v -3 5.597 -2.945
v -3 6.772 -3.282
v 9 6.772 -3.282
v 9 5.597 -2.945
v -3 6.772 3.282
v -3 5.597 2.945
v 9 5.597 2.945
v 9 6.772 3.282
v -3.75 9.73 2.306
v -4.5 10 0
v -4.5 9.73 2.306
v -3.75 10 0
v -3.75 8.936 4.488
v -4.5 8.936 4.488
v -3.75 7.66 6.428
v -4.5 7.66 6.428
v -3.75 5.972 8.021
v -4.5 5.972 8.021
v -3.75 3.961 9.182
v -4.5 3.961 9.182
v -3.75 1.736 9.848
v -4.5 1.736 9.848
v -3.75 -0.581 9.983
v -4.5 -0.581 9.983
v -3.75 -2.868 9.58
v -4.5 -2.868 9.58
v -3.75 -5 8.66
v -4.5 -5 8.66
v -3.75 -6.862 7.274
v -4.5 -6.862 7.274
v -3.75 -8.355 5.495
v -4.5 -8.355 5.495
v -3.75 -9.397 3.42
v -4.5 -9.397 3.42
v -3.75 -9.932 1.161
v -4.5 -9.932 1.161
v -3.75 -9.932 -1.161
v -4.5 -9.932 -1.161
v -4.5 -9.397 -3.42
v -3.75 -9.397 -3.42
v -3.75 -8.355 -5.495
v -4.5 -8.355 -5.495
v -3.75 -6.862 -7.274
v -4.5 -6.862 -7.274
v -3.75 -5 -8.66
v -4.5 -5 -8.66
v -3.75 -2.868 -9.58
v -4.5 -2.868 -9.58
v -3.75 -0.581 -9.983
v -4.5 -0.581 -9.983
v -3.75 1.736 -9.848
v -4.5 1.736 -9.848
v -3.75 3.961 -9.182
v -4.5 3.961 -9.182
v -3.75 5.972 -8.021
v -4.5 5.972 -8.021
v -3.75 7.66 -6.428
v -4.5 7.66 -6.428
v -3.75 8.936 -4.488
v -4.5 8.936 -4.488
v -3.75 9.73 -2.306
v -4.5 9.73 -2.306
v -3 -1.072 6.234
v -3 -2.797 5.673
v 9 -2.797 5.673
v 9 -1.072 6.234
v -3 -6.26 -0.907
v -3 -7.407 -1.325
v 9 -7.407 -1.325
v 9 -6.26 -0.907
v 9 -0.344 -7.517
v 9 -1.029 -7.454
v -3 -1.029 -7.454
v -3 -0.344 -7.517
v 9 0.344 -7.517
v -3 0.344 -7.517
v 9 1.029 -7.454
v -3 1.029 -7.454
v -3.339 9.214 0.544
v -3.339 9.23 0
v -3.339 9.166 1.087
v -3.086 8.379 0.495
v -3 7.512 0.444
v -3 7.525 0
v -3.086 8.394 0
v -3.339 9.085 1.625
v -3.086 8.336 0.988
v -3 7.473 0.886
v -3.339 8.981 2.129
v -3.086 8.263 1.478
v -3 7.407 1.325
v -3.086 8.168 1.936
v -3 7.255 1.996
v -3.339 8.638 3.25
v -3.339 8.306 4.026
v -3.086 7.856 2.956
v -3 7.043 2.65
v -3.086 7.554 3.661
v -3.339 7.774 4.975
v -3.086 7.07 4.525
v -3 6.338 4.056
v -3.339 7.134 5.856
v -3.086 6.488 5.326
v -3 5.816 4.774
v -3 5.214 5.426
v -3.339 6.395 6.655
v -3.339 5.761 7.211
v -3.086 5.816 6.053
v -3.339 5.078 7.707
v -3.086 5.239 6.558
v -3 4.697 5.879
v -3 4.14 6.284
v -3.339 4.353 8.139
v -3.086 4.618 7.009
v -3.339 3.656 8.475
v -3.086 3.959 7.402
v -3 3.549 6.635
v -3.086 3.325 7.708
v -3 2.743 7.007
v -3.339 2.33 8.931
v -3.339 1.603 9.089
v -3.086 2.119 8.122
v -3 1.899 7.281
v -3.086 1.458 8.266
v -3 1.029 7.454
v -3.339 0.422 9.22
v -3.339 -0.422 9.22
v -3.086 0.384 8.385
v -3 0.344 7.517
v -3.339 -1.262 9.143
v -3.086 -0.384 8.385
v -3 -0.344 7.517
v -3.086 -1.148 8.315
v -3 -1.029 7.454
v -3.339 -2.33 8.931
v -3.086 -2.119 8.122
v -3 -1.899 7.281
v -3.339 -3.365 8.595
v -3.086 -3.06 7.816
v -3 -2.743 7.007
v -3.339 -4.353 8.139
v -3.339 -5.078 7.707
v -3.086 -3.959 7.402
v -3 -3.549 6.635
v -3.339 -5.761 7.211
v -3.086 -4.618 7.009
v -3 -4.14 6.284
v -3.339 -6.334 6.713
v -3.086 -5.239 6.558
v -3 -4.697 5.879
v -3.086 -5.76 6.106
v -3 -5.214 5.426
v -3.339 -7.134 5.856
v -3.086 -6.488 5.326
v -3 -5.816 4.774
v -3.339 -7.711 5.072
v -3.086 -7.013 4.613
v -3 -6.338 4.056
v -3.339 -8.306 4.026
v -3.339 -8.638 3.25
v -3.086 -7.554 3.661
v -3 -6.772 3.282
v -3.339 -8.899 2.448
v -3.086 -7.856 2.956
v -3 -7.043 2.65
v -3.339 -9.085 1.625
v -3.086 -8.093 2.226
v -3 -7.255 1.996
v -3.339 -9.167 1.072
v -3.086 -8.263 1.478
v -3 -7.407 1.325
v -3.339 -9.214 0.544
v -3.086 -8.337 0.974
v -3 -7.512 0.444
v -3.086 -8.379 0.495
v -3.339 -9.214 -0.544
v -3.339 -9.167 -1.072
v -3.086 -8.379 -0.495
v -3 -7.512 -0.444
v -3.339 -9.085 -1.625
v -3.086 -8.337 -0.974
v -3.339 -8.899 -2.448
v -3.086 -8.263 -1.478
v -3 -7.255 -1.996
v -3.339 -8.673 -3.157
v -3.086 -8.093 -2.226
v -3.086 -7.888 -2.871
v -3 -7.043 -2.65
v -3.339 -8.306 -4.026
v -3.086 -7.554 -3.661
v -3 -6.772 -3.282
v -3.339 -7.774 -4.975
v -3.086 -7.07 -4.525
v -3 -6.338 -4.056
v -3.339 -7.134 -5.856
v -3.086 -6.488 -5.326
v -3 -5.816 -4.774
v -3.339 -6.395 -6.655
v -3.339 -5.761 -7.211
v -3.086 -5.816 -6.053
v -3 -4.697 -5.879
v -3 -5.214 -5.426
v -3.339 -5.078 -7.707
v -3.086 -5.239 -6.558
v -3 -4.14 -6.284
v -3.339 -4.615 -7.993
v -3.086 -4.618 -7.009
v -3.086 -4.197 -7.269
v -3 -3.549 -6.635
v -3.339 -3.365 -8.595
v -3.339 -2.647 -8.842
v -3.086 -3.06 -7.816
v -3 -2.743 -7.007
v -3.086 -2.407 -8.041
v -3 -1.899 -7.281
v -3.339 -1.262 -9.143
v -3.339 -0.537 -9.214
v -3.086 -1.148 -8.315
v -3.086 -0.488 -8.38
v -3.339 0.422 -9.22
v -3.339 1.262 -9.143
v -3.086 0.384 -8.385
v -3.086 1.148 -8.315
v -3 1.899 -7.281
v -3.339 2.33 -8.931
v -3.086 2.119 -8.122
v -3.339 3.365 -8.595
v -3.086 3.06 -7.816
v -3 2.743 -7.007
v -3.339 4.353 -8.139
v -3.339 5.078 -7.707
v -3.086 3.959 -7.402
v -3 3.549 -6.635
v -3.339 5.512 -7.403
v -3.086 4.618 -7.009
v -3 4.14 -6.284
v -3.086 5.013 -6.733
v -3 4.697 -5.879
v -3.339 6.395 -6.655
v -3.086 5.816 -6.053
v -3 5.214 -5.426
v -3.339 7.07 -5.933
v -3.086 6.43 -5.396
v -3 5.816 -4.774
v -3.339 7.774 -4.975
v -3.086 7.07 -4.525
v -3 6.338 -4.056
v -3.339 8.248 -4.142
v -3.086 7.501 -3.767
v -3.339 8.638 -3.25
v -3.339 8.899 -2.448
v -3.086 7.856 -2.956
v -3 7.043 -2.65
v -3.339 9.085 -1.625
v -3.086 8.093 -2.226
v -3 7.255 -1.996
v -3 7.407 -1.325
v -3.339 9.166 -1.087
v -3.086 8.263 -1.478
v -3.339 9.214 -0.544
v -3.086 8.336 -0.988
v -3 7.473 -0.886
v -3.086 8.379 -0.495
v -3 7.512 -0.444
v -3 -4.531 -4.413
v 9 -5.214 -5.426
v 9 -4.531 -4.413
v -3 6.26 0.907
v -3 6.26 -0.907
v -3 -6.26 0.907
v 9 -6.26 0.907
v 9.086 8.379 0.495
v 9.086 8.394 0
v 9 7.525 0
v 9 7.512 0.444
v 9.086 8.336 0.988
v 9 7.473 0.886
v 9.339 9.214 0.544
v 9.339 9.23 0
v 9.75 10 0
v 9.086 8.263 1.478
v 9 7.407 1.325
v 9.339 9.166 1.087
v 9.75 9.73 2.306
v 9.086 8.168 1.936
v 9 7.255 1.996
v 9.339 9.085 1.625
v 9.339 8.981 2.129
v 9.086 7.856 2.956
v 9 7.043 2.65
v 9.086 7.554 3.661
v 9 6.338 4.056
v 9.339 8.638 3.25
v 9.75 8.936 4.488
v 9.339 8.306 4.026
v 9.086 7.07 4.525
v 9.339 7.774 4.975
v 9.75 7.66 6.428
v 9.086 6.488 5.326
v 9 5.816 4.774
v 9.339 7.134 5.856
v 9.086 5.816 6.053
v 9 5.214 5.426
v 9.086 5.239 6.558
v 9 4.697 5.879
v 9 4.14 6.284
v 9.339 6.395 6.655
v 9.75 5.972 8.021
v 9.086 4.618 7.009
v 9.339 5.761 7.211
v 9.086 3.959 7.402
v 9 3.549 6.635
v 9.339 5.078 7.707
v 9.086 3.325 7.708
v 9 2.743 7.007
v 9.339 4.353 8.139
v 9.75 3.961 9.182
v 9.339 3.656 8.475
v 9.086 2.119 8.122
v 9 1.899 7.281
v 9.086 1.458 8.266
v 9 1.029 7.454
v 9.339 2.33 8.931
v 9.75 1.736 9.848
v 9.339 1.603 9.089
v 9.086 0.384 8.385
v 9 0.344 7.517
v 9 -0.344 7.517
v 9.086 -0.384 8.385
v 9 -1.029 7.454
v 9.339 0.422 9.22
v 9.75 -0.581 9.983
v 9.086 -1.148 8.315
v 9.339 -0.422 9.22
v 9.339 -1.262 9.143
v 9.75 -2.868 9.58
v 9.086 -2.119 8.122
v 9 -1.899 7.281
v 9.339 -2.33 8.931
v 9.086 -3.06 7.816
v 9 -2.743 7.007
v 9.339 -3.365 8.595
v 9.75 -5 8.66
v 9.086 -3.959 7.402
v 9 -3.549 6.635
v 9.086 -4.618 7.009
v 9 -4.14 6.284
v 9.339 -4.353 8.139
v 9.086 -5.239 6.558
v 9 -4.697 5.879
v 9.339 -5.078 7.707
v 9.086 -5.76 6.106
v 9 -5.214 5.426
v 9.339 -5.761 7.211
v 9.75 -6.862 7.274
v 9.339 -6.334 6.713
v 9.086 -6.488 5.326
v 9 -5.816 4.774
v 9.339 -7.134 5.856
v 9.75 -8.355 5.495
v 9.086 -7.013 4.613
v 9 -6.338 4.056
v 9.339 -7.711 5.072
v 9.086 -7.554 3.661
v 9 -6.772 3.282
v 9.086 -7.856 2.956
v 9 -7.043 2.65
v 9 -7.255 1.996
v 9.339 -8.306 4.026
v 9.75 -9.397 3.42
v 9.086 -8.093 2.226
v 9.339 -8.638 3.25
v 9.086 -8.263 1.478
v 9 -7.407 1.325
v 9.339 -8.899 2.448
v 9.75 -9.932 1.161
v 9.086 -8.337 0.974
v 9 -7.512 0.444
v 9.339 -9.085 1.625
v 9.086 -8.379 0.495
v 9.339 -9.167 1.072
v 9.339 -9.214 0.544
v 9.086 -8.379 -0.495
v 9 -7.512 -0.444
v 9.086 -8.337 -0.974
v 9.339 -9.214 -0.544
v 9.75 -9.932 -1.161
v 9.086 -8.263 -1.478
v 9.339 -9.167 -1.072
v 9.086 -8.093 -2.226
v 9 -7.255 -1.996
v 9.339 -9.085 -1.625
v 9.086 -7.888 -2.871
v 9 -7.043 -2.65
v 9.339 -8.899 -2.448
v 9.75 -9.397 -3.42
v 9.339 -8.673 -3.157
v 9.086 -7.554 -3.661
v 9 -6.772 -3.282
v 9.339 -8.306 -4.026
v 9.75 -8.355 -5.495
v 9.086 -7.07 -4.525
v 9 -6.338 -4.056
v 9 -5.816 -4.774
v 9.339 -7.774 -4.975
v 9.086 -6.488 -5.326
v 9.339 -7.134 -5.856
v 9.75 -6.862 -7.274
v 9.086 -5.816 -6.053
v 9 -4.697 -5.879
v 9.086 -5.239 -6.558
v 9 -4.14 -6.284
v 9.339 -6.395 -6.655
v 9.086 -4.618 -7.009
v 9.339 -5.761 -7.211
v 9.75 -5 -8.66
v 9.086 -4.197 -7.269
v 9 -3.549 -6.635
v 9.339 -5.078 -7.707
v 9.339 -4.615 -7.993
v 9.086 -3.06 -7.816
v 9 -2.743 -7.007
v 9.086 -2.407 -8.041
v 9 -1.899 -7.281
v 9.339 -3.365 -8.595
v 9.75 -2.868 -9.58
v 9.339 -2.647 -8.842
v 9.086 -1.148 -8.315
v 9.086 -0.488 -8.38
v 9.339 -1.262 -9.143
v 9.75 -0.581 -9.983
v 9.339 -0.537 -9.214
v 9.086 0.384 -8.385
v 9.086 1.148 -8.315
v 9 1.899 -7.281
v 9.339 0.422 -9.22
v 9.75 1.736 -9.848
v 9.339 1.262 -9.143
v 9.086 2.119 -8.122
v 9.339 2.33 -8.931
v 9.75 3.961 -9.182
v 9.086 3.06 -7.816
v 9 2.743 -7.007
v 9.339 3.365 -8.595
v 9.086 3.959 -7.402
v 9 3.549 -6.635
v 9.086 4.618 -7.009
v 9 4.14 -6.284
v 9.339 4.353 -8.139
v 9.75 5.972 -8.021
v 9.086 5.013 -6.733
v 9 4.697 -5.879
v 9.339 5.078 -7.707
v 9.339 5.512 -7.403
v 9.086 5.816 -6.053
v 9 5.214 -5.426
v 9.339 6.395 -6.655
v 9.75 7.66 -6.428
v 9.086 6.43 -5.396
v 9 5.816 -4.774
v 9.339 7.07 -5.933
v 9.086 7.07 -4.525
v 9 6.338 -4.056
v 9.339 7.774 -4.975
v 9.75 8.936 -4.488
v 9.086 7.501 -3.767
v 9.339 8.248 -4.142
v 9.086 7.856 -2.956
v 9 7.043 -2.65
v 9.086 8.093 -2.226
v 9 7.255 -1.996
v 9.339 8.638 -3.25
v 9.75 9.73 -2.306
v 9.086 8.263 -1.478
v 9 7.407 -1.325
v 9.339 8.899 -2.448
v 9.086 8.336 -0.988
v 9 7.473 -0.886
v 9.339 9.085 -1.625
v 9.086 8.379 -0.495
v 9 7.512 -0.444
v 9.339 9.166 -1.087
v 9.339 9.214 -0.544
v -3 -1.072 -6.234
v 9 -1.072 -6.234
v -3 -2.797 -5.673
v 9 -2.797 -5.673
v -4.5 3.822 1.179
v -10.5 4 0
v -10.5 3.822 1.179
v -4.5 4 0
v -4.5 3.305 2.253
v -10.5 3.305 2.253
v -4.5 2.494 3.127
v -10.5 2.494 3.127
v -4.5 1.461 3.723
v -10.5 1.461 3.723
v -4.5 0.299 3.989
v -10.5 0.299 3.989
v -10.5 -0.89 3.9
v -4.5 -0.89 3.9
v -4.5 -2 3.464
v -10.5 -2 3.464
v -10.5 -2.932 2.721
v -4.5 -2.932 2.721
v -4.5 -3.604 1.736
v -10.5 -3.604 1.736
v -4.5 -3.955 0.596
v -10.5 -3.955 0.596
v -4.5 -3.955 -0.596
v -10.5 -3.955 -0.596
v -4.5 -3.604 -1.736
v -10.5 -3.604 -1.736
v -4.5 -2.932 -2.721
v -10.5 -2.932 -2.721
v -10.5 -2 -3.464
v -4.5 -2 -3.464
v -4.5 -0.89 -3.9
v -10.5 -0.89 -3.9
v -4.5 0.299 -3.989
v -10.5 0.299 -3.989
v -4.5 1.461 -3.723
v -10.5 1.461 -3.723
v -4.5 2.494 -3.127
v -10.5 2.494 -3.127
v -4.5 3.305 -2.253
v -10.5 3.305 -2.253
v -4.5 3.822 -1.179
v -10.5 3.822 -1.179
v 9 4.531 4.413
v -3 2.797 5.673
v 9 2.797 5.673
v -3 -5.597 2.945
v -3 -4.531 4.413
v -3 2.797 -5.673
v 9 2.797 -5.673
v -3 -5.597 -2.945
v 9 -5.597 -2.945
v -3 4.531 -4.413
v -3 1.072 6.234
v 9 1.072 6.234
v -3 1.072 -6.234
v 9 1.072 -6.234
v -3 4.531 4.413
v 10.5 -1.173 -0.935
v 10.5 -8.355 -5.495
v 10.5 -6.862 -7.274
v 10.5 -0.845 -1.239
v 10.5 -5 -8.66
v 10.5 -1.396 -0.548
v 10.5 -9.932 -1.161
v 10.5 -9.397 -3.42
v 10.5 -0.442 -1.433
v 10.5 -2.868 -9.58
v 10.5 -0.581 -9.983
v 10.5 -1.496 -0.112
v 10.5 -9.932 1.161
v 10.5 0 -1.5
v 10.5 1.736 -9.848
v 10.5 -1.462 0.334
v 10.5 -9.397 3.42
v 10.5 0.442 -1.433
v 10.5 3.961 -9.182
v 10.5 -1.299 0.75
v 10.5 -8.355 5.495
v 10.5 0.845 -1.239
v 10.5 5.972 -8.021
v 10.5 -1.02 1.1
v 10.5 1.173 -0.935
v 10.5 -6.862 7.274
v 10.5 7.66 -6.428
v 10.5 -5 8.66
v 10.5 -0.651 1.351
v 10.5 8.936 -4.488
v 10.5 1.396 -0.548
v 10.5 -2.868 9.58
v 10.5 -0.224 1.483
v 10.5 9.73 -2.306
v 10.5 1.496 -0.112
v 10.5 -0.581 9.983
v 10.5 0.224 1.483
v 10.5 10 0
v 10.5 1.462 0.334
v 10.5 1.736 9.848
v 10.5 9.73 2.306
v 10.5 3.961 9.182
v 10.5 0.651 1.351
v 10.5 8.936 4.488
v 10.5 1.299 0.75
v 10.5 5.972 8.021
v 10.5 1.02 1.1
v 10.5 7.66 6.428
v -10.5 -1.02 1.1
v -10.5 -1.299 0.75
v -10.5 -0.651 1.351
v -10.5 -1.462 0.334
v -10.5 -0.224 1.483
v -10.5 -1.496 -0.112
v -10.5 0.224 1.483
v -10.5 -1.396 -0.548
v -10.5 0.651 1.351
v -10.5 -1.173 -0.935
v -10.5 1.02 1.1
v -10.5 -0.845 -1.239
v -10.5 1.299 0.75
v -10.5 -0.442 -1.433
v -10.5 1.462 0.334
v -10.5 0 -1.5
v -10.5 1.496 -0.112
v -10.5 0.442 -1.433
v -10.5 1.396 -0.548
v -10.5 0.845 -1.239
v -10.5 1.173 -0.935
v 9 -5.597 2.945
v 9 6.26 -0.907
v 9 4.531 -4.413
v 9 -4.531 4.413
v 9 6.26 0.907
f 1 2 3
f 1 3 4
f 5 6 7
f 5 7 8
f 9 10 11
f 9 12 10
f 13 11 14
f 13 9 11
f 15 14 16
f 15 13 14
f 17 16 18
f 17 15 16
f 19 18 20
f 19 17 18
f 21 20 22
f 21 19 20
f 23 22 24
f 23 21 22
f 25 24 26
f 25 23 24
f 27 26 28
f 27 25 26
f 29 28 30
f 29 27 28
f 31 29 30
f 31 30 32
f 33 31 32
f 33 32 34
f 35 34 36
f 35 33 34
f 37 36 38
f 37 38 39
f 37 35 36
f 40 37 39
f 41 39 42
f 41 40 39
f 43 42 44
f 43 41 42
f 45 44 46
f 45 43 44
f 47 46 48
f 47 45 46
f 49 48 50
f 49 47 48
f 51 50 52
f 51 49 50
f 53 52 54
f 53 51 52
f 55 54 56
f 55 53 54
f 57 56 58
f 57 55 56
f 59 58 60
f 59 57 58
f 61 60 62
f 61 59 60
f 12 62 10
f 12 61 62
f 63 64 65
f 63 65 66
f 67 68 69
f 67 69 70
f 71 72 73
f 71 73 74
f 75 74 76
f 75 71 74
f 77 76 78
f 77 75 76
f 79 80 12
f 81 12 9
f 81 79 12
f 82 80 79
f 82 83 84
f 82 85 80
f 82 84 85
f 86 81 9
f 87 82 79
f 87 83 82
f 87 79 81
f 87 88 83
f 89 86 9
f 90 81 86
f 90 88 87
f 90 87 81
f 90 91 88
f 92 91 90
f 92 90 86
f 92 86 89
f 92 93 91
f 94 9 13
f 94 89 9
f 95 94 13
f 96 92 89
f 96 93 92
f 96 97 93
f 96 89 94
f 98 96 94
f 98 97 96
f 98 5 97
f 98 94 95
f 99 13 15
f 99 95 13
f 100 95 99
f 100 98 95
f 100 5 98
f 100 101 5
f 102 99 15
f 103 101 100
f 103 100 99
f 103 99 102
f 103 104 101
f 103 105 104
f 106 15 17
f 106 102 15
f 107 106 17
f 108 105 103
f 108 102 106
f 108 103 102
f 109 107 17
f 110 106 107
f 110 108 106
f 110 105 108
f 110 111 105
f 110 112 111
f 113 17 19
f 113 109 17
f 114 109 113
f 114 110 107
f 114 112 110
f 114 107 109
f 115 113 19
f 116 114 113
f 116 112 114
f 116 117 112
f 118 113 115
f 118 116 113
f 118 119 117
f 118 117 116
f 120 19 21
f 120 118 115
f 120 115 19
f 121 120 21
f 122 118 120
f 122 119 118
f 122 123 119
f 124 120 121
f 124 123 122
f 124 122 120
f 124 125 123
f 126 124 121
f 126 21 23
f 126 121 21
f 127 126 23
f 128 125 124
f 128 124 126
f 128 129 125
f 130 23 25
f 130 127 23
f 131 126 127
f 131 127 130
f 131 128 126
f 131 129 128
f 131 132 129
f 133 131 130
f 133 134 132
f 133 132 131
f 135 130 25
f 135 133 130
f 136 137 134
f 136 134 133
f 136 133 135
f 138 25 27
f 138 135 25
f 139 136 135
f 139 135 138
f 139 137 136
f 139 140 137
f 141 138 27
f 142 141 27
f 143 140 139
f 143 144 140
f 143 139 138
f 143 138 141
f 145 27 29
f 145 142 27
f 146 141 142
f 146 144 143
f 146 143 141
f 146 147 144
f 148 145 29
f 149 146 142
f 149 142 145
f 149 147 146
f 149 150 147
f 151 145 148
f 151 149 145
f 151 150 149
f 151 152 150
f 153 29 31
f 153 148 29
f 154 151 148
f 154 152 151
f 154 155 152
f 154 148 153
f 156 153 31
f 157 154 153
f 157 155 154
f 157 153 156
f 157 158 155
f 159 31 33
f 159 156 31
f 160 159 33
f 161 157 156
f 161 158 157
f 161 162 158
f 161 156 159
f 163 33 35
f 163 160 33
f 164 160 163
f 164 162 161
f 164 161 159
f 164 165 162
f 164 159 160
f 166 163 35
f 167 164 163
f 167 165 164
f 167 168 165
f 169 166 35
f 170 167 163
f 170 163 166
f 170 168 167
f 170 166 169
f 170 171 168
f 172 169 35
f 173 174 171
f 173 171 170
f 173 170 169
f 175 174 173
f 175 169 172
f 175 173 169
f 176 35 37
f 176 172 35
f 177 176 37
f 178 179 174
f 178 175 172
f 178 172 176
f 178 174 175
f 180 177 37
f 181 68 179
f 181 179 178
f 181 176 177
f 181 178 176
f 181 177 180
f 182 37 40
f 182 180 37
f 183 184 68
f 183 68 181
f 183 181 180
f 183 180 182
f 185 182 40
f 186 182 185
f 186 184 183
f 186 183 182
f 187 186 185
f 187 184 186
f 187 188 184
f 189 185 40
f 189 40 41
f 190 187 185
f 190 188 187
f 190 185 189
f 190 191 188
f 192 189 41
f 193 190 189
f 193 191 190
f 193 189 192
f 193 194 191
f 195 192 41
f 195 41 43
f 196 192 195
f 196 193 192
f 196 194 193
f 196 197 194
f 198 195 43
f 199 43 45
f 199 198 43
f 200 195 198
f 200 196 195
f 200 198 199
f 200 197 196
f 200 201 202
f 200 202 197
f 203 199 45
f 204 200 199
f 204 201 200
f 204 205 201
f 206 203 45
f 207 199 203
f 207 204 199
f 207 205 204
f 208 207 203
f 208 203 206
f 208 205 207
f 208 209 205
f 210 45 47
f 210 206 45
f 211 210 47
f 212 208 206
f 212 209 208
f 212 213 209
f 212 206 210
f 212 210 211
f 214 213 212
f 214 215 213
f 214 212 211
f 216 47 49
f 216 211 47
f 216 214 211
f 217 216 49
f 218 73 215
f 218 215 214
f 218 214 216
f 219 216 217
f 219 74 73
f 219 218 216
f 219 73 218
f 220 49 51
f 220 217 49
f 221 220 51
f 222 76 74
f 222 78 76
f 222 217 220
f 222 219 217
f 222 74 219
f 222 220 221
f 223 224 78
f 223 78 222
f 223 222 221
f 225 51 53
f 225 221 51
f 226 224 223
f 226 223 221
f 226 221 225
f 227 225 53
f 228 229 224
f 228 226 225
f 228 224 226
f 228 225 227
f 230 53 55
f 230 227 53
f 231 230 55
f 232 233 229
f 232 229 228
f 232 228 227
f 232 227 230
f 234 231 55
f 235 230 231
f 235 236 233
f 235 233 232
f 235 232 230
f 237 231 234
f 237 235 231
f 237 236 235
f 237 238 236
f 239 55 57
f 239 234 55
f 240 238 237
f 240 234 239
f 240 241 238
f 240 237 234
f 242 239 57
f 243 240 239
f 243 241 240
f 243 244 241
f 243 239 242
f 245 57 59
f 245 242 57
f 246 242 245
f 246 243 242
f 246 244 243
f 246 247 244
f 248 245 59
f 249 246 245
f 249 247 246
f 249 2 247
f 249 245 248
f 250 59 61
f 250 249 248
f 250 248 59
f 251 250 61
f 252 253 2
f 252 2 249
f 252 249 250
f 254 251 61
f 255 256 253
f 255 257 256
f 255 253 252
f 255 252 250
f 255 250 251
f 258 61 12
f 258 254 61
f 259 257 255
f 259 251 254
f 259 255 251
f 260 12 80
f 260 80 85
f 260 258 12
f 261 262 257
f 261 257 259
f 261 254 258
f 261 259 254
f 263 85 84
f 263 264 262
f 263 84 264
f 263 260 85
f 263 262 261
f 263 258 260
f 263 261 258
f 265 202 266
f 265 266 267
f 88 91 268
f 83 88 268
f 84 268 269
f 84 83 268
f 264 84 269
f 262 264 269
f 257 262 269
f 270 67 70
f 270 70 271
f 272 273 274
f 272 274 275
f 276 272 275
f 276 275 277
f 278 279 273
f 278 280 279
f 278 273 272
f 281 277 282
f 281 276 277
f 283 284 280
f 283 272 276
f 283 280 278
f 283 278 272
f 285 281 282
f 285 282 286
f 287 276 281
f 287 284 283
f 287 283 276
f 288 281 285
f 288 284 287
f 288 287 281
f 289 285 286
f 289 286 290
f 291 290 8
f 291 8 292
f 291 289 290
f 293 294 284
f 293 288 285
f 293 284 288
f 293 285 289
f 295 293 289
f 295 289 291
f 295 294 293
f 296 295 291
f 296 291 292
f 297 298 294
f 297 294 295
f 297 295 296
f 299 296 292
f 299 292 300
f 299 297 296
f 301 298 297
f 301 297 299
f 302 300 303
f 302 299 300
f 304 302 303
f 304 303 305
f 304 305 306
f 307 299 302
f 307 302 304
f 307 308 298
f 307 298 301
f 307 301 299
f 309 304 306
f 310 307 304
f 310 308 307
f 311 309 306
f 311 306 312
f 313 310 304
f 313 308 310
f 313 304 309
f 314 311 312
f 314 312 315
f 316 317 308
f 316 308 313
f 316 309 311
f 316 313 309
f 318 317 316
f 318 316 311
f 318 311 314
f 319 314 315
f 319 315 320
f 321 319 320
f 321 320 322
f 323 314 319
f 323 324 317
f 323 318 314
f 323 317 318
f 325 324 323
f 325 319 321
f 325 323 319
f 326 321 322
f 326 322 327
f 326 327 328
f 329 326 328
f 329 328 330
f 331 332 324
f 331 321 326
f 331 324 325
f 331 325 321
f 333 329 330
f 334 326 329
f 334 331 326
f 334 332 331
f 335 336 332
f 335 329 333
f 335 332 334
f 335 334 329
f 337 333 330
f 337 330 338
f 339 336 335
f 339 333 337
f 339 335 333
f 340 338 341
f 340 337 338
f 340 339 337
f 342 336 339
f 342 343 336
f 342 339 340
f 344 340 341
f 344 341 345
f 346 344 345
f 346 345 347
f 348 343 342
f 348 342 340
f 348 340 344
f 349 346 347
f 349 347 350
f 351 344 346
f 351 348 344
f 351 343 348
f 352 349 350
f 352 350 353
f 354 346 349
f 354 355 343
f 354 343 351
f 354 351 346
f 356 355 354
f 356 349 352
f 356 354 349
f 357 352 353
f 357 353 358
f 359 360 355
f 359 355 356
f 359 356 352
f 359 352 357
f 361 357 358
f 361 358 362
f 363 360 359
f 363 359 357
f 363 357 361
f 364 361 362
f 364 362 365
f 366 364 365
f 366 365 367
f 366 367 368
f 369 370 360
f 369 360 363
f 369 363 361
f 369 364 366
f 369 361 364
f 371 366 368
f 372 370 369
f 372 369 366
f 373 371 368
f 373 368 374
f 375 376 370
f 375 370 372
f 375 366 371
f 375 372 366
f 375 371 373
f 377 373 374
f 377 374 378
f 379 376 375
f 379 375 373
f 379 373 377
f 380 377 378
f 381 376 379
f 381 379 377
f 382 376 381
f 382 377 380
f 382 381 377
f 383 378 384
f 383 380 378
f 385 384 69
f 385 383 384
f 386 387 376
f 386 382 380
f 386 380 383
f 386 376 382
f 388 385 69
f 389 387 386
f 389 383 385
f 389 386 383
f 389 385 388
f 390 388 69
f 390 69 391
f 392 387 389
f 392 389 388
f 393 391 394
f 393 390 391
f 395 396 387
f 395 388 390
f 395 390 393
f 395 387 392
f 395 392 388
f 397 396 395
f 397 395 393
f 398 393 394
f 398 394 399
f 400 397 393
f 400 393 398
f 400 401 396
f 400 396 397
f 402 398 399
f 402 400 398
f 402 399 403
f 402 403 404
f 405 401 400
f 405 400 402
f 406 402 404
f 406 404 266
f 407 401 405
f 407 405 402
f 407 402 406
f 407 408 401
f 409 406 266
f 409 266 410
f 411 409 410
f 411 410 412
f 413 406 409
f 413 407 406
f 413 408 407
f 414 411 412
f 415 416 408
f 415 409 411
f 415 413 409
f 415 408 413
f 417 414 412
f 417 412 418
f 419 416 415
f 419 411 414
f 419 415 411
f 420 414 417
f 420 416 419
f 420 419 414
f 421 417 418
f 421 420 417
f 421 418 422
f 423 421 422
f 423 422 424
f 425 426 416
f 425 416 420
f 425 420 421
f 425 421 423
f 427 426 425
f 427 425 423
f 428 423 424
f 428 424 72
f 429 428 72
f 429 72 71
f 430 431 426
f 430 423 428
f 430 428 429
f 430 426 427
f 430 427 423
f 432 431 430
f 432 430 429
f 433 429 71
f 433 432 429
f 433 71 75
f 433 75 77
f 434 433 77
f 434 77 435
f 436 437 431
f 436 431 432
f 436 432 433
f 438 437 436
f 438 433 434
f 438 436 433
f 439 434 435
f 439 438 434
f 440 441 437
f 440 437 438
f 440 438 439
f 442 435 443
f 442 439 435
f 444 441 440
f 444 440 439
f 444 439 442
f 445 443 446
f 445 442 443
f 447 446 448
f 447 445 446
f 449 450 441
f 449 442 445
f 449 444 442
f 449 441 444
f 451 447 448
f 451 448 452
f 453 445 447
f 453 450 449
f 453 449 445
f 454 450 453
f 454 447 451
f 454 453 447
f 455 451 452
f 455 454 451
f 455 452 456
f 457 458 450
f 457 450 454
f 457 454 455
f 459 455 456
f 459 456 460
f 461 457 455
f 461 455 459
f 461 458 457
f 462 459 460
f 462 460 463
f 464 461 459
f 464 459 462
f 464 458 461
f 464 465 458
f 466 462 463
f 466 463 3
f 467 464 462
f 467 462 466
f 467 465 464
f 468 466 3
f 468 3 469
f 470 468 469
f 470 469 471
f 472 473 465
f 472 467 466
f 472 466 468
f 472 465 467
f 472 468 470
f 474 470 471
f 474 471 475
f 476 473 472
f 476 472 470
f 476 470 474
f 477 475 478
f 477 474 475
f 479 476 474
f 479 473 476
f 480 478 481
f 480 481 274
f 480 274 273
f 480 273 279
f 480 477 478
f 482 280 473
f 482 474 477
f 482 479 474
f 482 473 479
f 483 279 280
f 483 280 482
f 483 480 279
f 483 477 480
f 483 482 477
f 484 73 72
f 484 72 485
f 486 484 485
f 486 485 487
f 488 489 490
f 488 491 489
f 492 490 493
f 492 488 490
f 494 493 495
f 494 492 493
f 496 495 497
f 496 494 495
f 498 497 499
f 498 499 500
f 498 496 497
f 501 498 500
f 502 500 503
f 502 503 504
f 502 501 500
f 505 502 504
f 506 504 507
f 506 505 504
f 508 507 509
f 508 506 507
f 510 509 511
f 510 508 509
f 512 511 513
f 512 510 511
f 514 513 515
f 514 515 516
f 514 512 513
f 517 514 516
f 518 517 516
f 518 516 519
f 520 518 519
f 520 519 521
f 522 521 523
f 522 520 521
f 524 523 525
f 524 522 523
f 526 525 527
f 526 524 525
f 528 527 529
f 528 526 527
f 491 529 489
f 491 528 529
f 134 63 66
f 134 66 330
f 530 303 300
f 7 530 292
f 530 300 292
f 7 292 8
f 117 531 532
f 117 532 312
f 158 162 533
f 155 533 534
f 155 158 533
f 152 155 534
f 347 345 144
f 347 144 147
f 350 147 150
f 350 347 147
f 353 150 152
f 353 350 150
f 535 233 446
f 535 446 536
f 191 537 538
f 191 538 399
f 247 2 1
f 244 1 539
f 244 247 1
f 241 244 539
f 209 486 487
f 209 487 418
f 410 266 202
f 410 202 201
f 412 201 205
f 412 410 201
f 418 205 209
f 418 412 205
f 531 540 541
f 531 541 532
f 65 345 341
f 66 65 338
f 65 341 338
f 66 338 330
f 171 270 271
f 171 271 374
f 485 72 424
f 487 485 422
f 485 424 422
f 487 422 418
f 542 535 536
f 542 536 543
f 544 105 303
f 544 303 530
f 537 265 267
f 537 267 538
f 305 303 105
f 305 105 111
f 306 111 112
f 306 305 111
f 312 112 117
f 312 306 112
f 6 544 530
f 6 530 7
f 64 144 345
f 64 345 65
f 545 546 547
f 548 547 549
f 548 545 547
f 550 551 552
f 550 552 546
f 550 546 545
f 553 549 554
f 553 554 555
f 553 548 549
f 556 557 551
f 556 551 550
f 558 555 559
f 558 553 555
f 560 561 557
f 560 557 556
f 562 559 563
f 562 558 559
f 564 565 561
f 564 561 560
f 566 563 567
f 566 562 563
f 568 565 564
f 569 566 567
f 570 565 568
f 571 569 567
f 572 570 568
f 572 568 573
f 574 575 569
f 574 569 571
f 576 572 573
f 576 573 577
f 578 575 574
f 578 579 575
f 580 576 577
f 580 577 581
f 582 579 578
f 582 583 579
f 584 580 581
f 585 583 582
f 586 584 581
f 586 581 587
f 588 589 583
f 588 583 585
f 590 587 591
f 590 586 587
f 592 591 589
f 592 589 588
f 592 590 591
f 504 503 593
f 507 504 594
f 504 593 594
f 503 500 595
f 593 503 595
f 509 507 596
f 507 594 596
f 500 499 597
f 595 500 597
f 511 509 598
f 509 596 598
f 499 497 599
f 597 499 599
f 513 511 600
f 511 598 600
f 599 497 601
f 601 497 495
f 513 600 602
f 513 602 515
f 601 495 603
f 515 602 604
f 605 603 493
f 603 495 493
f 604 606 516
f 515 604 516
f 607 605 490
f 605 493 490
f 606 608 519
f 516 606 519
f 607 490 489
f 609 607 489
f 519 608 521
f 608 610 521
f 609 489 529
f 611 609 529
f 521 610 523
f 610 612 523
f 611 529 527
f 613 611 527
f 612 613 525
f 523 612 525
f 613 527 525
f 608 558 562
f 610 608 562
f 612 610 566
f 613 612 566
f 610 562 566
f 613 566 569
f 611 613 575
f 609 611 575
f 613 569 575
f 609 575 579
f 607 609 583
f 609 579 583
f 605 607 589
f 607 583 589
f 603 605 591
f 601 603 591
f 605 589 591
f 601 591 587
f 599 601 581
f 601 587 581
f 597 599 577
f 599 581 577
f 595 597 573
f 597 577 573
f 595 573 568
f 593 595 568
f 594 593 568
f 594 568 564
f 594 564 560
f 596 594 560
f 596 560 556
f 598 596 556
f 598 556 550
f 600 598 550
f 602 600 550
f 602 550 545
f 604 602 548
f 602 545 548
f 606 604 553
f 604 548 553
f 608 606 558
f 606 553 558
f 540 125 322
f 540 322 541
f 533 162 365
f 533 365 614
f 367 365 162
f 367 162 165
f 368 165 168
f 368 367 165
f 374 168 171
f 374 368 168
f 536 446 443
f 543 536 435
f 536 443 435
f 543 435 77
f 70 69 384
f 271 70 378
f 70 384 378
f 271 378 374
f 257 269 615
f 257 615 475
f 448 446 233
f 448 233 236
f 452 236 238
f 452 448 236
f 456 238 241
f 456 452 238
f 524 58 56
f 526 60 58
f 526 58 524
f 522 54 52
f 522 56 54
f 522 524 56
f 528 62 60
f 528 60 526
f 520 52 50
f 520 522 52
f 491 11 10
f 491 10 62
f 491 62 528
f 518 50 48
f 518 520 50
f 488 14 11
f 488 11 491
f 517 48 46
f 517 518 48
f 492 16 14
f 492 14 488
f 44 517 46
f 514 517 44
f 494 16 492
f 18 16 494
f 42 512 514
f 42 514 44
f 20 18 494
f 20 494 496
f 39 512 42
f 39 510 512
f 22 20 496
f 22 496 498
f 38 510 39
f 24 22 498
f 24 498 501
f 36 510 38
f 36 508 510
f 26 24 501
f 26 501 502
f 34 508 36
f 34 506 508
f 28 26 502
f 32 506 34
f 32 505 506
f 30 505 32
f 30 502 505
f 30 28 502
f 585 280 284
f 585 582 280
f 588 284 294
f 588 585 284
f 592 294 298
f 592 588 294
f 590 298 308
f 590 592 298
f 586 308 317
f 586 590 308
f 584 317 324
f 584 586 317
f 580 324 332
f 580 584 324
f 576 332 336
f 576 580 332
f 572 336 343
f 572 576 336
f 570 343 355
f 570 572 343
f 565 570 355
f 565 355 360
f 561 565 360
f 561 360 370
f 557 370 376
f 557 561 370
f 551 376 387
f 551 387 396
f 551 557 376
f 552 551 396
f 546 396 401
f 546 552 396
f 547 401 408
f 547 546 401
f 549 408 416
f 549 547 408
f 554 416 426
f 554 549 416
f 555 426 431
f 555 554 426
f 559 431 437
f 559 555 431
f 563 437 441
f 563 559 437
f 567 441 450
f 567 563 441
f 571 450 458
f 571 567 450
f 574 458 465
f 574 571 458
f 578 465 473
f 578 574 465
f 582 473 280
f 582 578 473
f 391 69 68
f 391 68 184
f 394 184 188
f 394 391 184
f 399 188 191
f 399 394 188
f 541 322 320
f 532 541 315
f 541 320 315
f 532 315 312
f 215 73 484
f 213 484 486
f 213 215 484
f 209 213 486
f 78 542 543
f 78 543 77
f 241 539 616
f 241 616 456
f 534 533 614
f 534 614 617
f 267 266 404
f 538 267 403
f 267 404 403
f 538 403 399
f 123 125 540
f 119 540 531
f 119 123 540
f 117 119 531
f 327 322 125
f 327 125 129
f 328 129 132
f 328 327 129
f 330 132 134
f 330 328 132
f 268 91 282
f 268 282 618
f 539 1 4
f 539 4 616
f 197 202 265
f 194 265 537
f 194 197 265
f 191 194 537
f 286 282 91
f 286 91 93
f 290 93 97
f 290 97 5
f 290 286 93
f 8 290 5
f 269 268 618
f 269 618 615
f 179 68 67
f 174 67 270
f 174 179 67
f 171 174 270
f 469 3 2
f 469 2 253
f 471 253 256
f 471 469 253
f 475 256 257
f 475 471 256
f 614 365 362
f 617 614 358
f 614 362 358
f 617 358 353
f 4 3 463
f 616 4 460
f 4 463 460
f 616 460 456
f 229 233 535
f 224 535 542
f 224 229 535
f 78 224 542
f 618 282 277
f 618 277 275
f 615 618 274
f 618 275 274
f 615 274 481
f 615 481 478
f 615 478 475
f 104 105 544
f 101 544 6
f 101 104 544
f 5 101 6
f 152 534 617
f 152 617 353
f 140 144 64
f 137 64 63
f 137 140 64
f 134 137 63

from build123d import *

# Parameters (mm, degrees)
CUT_EXTRUDE1_START  = -3
CUT_EXTRUDE1_DEPTH  = 12
CIRPATTERN1_COUNT   = 10
BOSS_EXTRUDE1_START = 10.5
SKETCH7_R           = 2.383452373
SKETCH7_R_2         = 1.5
BOSS_EXTRUDE1_DEPTH = 21


with BuildPart() as part:
    # Sketch6 → Revolve1 (revolve)
    with BuildSketch(Plane.XY):
        with BuildLine():
            Line((9.75, 10), (10.5, 10))
            Line((10.5, 10), (10.5, 2))
            Line((10.5, 2), (-10.5, 2))
            Line((-10.5, 2), (-10.5, 4))
            Line((-10.5, 4), (-4.5, 4))
            Line((-4.5, 4), (-4.5, 10))
            Line((-4.5, 10), (-3.75, 10))
            ThreePointArc((-3.75, 10), (-3.191617437, 8.818070474), (-3, 7.525))
            Line((-3, 7.525), (9, 7.525))
            ThreePointArc((9, 7.525), (9.191617437, 8.818070474), (9.75, 10))
        make_face()
    revolve(axis=Axis((-10.5, 0, 0), (1, 0, 0)))

    # Sketch3 → Cut-Extrude1 (cut)
    with BuildSketch(Plane(origin=(0, 0, 0), x_dir=(0, 0, -1), z_dir=(1, 0, 0)).offset(CUT_EXTRUDE1_START)):
        with BuildLine():
            Line((-1.325, 7.407428704), (-0.907223869, 6.259598218))
            Line((-0.907223869, 6.259598218), (0.907223869, 6.259598218))
            Line((0.907223869, 6.259598218), (1.325, 7.407428704))
            ThreePointArc((1.325, 7.407428704), (0, 7.525), (-1.325, 7.407428704))
        make_face()
    cut_extrude1 = extrude(amount=CUT_EXTRUDE1_DEPTH, mode=Mode.SUBTRACT)

    # CirPattern1: Cut-Extrude1 ×10 about axis
    cirpattern1_axis = Axis((0, 0, 0), (1, 0, 0))
    for i in range(1, CIRPATTERN1_COUNT):
        add(cut_extrude1.rotate(cirpattern1_axis, i * 360 / CIRPATTERN1_COUNT), mode=Mode.SUBTRACT)

    # Sketch7 → Boss-Extrude1 (add)
    with BuildSketch(Plane(origin=(0, 0, 0), x_dir=(0, 0, -1), z_dir=(1, 0, 0)).offset(BOSS_EXTRUDE1_START)):
        Circle(SKETCH7_R)
        Circle(SKETCH7_R_2, mode=Mode.SUBTRACT)
    extrude(amount=-BOSS_EXTRUDE1_DEPTH)


solid = part.part
